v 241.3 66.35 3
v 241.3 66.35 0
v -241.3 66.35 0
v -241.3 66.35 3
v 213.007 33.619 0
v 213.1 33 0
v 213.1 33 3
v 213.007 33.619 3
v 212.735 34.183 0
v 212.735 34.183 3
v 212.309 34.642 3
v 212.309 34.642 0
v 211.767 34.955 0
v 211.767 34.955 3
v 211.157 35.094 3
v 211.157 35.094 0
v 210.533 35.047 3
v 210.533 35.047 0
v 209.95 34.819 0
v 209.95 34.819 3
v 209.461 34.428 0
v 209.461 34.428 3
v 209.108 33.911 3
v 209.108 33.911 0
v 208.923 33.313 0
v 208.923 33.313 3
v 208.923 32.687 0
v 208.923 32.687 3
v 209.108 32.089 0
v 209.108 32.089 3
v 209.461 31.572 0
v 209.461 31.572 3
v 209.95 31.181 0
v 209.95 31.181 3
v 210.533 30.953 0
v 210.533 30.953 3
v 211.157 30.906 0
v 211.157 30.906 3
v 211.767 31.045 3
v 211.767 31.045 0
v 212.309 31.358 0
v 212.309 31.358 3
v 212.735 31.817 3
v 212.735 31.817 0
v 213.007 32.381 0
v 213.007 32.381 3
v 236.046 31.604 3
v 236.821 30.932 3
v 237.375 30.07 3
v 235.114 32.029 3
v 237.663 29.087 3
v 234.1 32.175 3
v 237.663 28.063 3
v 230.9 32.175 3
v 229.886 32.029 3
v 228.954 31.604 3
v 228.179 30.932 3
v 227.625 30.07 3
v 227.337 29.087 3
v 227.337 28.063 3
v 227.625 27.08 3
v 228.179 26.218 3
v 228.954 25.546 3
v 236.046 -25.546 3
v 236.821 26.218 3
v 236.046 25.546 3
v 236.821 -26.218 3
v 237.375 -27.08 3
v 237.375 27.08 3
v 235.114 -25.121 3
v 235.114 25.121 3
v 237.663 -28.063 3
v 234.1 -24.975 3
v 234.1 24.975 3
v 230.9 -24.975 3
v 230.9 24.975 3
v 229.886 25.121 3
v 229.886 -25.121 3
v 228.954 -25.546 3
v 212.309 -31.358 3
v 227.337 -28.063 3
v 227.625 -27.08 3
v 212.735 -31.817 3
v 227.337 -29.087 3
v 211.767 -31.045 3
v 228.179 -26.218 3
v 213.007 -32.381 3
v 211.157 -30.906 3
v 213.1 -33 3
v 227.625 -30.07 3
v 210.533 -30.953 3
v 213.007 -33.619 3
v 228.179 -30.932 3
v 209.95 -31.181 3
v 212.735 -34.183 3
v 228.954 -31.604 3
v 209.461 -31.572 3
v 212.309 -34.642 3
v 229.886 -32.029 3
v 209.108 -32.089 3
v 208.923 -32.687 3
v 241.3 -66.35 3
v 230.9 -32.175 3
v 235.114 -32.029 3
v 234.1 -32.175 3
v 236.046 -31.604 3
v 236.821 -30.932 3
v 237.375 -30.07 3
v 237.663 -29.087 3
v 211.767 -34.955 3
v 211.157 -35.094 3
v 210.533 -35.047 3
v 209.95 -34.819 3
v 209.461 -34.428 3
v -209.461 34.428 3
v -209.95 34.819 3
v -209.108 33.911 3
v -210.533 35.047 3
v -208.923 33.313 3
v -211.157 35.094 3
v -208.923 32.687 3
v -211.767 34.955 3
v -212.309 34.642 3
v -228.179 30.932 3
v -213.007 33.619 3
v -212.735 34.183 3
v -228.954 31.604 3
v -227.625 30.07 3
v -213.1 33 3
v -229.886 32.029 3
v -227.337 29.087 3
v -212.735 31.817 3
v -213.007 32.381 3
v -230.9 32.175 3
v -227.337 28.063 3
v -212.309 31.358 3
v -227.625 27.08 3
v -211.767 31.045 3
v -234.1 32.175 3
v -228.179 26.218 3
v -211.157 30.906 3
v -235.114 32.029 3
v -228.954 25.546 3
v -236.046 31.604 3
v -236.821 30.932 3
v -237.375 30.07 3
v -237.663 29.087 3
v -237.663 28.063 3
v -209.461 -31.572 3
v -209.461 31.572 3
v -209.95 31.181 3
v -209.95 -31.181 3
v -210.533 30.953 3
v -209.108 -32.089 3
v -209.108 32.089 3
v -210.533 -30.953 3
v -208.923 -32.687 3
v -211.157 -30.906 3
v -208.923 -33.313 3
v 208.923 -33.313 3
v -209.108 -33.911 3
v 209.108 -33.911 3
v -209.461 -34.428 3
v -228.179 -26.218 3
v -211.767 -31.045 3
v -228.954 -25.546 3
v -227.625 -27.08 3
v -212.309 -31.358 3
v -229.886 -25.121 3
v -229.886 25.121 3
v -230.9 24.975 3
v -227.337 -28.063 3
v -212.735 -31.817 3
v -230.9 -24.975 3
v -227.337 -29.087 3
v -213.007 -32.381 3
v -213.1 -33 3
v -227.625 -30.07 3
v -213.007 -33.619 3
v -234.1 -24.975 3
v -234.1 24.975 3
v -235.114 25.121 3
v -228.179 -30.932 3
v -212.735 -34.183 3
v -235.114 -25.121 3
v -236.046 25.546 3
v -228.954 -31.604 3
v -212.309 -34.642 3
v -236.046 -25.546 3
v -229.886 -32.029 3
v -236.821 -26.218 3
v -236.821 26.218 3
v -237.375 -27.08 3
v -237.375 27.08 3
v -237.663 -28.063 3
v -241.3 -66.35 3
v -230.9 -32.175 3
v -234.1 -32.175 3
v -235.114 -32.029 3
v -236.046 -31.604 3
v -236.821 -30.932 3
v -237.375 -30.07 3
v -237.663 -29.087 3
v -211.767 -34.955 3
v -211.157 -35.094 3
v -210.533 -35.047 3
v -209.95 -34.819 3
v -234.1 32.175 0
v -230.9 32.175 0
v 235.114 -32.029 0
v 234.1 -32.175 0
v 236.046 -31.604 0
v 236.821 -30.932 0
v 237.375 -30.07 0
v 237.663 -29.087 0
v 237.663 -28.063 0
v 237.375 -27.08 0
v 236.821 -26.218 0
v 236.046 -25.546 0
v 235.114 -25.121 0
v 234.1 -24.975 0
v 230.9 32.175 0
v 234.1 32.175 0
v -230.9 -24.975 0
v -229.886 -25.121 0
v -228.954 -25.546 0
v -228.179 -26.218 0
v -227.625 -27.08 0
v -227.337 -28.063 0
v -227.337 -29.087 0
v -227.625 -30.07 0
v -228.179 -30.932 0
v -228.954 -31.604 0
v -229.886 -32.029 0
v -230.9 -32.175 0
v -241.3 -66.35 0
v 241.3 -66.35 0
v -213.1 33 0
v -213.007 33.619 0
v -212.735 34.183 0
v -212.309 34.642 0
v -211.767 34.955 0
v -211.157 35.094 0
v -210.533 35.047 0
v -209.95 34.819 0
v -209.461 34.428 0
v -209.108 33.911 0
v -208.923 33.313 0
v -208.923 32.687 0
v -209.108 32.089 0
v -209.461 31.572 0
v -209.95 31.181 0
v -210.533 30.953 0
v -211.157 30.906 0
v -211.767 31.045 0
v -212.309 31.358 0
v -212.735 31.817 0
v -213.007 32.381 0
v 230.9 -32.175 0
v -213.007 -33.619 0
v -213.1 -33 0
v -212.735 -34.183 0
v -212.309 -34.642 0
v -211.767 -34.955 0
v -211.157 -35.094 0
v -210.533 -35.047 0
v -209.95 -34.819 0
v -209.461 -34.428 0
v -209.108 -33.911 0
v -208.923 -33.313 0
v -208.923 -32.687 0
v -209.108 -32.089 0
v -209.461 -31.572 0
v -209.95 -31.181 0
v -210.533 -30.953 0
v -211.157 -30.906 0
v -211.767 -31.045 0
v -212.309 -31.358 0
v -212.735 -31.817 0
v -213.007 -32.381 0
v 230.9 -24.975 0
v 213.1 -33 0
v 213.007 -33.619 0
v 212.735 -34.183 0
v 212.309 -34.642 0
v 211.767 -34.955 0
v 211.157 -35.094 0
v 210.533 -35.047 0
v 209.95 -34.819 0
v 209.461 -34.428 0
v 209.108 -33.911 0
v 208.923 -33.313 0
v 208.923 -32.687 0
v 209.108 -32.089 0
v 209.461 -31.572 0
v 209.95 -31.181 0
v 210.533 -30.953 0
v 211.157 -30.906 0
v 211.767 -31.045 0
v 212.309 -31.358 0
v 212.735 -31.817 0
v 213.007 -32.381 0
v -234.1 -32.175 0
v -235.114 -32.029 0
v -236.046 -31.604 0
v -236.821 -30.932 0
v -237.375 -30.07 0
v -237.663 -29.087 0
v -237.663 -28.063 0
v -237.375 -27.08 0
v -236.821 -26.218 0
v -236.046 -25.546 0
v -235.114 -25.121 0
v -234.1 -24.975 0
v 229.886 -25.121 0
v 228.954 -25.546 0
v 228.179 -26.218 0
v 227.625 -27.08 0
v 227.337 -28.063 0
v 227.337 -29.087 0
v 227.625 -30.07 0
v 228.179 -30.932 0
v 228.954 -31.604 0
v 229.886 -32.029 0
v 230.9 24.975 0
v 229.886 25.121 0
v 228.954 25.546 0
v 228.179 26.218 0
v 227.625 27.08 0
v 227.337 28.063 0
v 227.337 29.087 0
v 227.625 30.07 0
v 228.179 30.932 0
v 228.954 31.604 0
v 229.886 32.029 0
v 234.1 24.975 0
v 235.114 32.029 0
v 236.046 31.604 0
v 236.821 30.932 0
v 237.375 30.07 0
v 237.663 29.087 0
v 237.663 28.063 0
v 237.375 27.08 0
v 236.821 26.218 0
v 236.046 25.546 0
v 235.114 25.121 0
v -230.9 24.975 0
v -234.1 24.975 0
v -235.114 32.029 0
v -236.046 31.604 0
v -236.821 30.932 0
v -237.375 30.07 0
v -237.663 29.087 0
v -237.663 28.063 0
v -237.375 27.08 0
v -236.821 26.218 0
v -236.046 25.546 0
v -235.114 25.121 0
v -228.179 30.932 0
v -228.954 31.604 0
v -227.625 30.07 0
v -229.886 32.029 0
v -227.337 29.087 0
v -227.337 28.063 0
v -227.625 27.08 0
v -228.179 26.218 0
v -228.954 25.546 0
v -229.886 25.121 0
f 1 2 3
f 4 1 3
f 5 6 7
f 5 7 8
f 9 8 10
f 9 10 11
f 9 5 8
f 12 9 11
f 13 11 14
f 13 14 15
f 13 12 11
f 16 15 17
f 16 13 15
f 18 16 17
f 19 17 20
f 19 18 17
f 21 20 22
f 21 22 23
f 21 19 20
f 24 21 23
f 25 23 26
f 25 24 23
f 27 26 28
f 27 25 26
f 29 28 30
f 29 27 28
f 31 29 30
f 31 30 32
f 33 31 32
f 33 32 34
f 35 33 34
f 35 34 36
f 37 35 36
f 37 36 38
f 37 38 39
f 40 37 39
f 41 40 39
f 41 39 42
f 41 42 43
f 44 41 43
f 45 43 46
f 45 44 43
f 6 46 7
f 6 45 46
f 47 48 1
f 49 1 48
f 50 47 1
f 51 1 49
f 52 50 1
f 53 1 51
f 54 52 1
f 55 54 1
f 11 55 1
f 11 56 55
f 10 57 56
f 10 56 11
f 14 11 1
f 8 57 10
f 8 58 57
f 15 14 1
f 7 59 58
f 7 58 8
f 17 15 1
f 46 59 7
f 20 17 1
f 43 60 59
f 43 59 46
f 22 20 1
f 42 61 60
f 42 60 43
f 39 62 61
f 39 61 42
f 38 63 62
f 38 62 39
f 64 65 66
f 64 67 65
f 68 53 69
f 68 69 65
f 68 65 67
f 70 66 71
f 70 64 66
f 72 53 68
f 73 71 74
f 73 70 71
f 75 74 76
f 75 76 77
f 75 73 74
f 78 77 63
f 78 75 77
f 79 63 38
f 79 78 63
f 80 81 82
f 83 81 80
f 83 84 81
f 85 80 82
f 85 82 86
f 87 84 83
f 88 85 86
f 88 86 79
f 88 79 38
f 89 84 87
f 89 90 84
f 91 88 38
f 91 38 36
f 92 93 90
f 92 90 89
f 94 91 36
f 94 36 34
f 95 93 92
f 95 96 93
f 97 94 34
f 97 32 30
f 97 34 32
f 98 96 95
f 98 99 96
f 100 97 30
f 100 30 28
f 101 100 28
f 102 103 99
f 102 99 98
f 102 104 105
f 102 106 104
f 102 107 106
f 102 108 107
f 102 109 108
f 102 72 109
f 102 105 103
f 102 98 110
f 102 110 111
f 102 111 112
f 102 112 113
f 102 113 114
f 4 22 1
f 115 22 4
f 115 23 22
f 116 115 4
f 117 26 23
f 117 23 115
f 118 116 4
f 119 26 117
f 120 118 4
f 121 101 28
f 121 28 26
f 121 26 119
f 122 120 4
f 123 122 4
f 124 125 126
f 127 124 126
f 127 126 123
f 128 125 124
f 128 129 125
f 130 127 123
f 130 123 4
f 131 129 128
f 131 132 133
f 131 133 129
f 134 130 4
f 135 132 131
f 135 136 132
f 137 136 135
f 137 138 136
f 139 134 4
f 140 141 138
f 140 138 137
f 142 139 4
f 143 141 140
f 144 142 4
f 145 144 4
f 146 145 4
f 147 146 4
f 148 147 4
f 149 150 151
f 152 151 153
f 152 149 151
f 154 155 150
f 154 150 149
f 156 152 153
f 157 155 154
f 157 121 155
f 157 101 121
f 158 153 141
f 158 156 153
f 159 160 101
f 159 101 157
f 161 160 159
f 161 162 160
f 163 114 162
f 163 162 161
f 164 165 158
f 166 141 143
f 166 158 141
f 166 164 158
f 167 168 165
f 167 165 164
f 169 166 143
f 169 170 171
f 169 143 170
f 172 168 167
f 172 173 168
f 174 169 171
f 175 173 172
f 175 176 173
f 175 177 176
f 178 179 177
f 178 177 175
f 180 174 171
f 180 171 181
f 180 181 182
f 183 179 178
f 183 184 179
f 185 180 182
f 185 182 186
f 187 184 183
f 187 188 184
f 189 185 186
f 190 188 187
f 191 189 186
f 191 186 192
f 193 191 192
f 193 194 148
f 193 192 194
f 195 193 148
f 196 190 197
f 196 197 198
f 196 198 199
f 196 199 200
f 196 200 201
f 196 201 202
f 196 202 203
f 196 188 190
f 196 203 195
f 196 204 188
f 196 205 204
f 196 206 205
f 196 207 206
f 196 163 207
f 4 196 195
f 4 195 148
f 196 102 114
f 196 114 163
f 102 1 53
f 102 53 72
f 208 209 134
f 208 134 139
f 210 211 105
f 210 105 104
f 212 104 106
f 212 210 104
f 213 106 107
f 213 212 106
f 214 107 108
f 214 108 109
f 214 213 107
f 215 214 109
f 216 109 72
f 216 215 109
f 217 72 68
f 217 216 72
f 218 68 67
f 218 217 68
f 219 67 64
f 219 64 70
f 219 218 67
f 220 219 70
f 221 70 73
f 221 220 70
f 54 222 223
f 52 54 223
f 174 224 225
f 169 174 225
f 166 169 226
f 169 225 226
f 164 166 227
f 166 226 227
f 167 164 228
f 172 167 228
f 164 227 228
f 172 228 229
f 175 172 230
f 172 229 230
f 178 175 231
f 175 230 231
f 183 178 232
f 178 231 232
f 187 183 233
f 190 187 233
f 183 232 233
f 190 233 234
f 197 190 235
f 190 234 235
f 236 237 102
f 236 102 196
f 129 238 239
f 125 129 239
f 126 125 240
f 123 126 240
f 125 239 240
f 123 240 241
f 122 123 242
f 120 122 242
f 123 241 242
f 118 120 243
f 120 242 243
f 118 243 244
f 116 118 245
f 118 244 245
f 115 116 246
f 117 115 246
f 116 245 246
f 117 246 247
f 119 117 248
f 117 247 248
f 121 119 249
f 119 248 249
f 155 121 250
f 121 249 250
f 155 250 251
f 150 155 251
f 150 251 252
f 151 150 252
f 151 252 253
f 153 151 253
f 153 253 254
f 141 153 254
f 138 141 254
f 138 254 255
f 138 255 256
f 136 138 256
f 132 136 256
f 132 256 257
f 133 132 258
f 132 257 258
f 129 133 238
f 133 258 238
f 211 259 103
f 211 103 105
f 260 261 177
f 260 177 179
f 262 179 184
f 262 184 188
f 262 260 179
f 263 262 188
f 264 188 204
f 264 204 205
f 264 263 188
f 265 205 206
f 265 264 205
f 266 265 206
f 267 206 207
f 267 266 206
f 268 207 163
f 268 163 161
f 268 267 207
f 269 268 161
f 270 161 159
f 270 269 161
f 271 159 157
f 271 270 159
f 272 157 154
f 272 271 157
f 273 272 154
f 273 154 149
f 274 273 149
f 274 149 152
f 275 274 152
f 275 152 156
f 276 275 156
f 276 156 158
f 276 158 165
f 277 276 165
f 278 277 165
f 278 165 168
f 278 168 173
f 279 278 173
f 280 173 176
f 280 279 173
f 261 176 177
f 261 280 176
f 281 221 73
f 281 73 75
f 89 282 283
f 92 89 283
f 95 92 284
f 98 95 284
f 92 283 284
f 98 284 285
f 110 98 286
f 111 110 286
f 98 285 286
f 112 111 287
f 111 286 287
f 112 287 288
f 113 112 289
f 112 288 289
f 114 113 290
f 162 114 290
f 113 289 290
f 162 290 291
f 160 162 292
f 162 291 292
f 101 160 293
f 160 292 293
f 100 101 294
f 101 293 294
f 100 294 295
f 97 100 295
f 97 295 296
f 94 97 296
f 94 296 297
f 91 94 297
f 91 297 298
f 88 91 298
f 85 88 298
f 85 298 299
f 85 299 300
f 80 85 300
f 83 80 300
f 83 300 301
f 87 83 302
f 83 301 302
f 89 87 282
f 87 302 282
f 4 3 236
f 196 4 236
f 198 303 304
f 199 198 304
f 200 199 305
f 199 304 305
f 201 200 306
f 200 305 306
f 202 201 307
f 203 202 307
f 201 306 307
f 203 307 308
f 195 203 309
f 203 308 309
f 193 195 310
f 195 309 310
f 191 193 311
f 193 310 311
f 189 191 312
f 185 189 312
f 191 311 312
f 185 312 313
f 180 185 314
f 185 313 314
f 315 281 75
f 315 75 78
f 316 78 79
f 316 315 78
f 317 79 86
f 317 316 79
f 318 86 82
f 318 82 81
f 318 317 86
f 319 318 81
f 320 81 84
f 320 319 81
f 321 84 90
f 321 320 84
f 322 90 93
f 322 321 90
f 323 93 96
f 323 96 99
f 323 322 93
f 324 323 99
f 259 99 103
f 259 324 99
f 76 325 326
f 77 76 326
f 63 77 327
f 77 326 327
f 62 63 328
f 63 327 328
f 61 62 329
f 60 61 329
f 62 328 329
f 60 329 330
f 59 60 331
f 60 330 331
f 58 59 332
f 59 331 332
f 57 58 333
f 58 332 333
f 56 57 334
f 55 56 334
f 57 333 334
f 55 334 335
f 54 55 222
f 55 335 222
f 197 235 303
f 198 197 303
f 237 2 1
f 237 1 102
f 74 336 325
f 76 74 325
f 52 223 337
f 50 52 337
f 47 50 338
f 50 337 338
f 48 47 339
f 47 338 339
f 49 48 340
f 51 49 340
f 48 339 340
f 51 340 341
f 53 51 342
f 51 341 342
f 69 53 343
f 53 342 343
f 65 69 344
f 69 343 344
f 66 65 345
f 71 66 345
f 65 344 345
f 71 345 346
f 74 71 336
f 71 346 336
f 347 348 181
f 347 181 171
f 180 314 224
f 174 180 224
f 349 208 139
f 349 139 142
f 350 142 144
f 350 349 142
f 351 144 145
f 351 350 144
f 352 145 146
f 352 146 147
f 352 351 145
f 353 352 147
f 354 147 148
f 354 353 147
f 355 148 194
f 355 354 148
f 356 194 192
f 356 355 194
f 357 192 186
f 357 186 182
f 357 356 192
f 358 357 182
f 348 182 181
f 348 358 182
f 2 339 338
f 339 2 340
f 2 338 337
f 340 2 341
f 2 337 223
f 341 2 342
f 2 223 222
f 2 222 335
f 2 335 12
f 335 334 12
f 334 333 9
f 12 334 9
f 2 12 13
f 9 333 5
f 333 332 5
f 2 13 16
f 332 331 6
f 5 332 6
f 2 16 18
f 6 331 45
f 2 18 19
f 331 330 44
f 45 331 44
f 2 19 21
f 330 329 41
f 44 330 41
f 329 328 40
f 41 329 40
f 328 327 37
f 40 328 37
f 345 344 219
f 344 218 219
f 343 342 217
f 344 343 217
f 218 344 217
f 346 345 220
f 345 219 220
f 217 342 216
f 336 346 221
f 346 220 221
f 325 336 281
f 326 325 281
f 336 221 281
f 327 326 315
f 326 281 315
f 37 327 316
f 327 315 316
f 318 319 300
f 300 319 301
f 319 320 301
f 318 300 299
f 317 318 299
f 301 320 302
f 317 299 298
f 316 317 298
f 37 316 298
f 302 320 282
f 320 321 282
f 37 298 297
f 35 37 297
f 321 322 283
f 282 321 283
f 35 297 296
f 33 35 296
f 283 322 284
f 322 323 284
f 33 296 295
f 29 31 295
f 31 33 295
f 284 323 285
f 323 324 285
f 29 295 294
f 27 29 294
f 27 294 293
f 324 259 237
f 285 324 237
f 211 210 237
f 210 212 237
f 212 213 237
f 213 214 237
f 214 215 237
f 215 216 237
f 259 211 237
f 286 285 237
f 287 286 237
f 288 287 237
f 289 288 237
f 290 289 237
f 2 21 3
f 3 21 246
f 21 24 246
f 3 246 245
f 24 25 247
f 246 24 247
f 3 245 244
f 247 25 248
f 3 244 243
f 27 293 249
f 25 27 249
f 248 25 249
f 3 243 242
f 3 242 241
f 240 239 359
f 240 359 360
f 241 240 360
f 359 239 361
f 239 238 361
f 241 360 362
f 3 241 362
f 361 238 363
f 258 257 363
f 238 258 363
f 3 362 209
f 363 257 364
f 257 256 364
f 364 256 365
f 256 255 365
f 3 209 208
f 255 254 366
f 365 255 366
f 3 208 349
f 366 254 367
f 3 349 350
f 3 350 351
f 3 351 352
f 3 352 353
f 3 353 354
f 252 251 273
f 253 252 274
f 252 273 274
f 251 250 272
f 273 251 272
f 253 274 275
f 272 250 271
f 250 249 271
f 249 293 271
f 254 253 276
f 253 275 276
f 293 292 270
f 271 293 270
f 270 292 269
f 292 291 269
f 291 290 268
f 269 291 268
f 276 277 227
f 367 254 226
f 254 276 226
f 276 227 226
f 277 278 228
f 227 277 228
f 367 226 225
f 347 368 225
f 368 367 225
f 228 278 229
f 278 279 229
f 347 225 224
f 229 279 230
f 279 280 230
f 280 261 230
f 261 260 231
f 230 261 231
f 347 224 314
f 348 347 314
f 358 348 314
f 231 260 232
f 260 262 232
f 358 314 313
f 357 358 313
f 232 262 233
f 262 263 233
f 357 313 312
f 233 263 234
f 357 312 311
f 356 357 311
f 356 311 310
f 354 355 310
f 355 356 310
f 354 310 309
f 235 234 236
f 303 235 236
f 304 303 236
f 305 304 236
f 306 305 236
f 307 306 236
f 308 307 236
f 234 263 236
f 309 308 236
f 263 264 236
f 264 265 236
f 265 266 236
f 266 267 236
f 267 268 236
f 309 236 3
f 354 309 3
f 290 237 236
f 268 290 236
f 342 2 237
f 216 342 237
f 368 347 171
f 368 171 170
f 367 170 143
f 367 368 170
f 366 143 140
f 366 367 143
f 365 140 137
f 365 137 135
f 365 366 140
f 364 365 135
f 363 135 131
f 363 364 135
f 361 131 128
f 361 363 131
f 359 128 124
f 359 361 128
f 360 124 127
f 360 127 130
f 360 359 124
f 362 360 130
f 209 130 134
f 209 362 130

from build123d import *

# Parameters (mm, degrees)
SKETCH1_W          = 241.3
SKETCH1_H          = 66.35
SKETCH1_R          = 2.1
BASE_FLANGE1_DEPTH = 3


# Sheet-metal steps are written as plain solids
with BuildPart() as part:
    # Sketch1 → Base-Flange1 (new body)
    with BuildSketch(Plane.XY):
        with Locations((120.65, 33.175)):
            Rectangle(SKETCH1_W, SKETCH1_H)
        with Locations((211, 33)):
            Circle(SKETCH1_R, mode=Mode.SUBTRACT)
        with BuildLine():
            Line((230.9, 32.175), (234.1, 32.175))
            ThreePointArc((234.1, 32.175), (237.7, 28.575), (234.1, 24.975))
            Line((234.1, 24.975), (230.9, 24.975))
            ThreePointArc((230.9, 24.975), (227.3, 28.575), (230.9, 32.175))
        make_face(mode=Mode.SUBTRACT)
    extrude(amount=BASE_FLANGE1_DEPTH)

    # Mirror1: part across plane


with BuildPart() as part_1:
    add(part.part)
    add(part.part.mirror(Plane(origin=(0, 0, 3), x_dir=(0, 0, 1), z_dir=(0, 1, 0))))

    # Mirror2: part across face


with BuildPart() as part_2:
    add(part_1.part)
    add(part_1.part.mirror(Plane(origin=(0, 0, 1.5), x_dir=(0, 0, 1), z_dir=(-1, 0, 0))))


solid = part_2.part
